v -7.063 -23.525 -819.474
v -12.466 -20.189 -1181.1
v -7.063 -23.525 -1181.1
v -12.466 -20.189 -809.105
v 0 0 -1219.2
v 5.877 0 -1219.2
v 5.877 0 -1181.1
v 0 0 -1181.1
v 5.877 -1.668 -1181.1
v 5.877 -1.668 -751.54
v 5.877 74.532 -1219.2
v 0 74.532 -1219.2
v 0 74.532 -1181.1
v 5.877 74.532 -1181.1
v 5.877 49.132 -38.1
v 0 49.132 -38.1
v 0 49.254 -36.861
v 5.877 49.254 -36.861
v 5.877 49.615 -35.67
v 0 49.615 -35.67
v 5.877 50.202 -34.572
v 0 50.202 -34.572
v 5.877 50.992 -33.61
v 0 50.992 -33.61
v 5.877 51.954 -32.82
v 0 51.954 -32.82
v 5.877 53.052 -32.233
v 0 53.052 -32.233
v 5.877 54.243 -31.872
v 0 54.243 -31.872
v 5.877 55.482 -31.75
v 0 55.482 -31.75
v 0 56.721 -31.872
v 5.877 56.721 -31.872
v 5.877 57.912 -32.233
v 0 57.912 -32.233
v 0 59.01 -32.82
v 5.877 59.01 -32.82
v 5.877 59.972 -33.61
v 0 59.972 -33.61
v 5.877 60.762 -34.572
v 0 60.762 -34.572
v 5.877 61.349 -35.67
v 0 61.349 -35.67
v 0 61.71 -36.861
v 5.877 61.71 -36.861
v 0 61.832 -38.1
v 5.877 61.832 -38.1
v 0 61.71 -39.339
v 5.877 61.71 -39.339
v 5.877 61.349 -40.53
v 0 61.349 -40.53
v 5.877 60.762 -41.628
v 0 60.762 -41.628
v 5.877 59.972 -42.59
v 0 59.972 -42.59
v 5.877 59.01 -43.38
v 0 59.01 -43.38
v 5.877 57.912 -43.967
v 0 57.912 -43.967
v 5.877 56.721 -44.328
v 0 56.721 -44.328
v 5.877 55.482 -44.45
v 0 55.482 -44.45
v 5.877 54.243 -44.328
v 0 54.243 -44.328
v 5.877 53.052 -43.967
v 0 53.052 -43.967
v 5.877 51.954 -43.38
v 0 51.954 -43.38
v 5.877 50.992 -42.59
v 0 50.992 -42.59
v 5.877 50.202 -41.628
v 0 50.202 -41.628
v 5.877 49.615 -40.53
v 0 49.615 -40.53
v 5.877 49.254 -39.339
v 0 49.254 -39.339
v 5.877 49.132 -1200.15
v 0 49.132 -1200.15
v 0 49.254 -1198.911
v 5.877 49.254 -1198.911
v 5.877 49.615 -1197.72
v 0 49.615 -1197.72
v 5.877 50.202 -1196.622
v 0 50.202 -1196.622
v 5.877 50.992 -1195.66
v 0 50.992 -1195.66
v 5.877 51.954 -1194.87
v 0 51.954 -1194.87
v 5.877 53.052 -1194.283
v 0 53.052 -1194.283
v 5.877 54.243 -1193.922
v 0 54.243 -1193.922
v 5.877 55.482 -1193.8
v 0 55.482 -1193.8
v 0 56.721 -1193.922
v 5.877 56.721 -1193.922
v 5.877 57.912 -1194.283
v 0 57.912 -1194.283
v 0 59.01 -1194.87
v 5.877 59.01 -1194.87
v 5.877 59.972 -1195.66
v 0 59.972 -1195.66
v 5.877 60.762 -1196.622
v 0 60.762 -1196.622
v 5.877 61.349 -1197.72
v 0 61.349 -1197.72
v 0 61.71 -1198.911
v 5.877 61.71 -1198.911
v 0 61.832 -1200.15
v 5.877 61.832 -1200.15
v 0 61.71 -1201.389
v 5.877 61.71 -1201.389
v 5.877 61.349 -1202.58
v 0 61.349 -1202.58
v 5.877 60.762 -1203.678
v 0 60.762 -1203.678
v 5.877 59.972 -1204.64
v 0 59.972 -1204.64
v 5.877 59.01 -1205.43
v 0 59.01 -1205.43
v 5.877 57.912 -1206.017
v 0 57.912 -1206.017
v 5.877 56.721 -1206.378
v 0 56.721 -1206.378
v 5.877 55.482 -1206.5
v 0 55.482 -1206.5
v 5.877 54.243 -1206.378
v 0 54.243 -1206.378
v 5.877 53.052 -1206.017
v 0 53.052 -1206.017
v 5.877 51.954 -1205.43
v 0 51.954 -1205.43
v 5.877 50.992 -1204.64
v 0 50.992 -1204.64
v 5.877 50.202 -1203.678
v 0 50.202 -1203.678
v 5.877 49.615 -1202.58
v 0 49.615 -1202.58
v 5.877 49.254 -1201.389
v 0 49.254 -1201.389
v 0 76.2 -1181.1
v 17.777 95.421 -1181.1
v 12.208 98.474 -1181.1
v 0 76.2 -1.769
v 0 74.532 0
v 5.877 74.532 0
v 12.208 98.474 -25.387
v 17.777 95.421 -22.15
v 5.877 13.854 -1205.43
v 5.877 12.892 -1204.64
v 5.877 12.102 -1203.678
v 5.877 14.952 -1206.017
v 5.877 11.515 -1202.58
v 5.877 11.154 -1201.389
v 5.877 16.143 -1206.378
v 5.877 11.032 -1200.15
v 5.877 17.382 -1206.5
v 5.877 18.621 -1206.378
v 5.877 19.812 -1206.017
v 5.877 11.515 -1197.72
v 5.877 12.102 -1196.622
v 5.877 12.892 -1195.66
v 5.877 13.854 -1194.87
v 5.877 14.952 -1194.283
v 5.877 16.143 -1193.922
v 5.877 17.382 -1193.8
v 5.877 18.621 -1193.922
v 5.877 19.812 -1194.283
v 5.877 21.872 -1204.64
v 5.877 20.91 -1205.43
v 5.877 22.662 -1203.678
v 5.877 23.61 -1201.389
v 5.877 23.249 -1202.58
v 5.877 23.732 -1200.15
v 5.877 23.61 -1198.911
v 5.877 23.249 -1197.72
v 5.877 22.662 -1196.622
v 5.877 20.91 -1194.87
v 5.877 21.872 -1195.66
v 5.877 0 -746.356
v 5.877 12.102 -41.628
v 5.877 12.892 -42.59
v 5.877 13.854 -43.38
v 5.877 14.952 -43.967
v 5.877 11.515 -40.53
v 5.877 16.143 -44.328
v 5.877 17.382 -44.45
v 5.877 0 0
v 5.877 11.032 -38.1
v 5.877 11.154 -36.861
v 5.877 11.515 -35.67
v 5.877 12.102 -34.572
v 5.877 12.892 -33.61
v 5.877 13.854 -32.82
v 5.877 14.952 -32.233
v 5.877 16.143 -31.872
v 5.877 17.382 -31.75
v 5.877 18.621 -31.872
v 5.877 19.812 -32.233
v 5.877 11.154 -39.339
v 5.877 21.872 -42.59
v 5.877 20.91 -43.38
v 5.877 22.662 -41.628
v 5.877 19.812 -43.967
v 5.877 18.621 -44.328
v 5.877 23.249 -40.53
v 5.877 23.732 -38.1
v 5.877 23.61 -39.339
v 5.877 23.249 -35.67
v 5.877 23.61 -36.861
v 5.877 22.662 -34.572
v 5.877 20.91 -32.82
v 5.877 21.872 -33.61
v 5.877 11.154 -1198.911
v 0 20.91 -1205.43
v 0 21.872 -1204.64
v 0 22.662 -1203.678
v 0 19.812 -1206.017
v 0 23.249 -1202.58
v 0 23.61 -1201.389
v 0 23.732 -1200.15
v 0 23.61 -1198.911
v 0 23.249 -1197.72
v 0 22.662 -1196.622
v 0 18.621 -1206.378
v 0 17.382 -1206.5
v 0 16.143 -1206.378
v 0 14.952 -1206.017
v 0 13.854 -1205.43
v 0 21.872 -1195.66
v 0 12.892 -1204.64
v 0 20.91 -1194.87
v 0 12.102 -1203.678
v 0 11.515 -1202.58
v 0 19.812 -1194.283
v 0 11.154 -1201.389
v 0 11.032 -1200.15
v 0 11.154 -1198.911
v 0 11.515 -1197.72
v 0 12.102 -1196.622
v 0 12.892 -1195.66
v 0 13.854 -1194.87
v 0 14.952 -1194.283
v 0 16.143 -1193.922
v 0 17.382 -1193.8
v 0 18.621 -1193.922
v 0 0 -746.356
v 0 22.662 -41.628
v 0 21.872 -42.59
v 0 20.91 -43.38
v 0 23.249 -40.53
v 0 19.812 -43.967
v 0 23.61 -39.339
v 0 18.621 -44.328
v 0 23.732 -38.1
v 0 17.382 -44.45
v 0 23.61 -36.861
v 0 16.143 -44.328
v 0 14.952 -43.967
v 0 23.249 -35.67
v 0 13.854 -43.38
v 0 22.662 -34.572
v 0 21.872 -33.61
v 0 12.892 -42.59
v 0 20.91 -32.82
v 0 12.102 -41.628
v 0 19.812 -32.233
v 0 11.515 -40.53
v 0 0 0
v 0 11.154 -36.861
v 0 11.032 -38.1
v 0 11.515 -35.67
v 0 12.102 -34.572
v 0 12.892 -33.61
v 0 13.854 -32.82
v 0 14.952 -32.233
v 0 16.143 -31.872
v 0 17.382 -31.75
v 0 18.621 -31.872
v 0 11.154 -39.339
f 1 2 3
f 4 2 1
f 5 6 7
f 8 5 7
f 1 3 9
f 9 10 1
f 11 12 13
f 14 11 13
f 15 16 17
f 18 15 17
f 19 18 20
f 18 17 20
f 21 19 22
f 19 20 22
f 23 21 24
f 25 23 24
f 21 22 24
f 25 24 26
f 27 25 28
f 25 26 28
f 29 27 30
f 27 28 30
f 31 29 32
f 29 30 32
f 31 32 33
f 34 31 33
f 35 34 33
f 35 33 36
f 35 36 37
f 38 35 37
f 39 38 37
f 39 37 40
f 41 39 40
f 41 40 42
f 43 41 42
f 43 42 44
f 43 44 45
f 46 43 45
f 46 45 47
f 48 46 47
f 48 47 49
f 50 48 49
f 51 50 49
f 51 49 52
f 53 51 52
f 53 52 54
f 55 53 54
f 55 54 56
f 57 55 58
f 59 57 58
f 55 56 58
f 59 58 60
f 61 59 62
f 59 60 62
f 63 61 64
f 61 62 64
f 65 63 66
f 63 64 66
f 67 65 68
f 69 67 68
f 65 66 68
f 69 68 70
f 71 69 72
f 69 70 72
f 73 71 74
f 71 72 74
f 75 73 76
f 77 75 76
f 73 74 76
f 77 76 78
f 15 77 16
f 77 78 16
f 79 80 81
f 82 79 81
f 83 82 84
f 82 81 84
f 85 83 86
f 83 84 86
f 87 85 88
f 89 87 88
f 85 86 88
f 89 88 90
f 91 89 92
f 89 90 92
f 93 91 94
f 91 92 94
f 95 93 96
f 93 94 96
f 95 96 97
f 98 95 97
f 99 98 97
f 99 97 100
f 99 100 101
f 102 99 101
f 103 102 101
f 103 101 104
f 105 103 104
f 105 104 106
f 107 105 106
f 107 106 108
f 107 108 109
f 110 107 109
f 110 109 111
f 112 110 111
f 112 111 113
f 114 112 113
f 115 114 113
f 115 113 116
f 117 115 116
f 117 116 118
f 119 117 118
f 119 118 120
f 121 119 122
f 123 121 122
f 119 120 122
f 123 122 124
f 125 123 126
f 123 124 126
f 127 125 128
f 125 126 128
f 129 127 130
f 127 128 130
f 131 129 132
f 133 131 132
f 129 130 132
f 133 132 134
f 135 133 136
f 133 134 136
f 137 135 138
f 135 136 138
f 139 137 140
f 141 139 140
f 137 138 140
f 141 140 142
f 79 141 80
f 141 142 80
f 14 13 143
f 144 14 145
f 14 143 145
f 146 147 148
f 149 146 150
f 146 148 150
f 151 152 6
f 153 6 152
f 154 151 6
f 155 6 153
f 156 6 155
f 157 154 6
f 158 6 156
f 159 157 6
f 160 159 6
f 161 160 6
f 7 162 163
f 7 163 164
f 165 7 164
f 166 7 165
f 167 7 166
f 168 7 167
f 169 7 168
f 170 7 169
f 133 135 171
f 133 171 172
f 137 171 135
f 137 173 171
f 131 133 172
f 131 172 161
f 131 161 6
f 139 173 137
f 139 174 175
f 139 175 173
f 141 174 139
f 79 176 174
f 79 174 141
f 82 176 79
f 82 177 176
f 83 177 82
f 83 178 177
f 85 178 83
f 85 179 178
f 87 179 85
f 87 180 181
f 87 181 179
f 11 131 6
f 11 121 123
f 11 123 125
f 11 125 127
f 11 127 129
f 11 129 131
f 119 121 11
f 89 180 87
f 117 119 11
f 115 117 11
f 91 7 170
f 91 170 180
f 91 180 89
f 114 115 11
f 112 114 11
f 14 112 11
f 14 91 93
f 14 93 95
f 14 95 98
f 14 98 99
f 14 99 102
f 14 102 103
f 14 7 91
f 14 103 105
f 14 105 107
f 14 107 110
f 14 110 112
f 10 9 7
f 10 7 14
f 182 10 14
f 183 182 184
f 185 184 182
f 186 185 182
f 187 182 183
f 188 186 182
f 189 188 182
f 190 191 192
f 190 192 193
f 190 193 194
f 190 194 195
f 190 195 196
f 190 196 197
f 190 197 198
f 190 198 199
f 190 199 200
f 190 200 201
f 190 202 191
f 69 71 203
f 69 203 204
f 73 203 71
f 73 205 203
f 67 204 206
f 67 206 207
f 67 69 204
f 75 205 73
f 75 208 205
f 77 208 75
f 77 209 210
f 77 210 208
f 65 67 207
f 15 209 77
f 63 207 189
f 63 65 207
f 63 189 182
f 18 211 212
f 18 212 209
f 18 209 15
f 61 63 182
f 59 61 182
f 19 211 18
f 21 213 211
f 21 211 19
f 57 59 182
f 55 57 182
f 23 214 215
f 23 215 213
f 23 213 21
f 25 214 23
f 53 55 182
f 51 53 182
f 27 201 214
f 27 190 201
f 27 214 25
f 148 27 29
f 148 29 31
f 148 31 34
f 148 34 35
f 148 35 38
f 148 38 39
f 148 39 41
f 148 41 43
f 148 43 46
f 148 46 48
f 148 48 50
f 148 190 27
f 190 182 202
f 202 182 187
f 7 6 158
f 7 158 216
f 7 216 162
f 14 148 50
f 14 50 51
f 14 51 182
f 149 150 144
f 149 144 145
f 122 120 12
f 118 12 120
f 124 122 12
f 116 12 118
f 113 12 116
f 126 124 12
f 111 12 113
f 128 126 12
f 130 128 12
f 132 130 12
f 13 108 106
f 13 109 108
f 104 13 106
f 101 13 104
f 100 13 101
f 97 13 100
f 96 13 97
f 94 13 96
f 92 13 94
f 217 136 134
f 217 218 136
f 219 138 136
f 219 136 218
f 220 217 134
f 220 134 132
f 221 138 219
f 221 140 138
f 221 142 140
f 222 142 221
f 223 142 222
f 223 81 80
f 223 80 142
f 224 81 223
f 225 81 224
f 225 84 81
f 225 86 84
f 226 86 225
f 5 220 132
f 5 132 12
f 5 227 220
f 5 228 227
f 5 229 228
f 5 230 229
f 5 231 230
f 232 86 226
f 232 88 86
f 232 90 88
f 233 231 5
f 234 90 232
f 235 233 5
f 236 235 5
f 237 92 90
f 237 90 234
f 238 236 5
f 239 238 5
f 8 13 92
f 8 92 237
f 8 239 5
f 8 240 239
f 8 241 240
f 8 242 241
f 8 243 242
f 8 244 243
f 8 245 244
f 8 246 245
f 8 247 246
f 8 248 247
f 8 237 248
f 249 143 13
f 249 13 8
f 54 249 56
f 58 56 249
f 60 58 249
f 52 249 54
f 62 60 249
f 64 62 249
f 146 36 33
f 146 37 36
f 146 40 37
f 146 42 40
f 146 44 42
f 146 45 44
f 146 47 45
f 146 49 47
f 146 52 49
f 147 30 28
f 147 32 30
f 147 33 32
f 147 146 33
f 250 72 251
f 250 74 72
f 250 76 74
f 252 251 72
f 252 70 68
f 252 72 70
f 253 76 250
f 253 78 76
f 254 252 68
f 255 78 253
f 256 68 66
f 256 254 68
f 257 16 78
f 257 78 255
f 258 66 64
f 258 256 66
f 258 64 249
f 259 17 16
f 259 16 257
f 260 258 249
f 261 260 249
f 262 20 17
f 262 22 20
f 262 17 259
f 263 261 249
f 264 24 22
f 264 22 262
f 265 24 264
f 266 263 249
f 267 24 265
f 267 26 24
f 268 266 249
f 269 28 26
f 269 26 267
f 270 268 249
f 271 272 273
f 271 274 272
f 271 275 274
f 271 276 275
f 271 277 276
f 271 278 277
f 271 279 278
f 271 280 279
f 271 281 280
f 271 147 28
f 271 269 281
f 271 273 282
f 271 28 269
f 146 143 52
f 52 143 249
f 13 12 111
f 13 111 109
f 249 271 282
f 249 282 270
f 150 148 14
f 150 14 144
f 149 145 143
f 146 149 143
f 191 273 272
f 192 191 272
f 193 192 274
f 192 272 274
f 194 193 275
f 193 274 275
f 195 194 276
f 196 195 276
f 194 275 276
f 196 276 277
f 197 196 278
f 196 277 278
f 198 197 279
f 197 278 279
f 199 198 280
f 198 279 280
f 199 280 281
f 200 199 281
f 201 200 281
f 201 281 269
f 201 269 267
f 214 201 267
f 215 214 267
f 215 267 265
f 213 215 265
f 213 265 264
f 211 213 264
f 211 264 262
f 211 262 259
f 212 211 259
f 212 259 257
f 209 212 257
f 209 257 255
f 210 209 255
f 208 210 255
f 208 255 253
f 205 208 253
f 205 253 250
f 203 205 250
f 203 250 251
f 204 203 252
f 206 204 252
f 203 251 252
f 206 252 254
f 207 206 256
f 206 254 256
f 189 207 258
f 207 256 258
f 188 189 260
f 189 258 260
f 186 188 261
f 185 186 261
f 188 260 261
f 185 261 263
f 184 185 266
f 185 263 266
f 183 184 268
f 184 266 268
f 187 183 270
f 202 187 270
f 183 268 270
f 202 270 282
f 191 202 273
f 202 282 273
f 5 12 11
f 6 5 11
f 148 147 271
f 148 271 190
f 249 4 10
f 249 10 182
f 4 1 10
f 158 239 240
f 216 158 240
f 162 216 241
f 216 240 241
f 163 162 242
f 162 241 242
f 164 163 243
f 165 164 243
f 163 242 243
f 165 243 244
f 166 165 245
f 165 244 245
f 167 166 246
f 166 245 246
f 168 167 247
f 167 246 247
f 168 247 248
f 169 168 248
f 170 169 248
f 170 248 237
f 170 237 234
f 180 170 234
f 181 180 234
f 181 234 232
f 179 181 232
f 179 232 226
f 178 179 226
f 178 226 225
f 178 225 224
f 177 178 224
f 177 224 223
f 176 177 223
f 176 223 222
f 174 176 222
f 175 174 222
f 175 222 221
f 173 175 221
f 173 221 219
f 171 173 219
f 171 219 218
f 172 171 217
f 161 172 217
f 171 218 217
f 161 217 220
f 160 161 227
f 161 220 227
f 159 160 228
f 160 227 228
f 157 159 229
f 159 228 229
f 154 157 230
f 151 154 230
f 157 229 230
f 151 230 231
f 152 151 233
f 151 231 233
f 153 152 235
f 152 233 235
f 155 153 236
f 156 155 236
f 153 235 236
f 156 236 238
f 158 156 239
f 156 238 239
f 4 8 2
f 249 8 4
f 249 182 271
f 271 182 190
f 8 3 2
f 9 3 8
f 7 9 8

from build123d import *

# Parameters (mm, degrees)
F1_DEPTH   = 1219.2
F2_W       = 23.9416415725
F2_H       = 38.1
F3_DEPTH   = 17.7778808061
F5_D       = 12.7
F7_D       = 12.7
F8_DEPTH   = 18.3432517809
F1_FACE1_W = 24.0414338853
F1_FACE1_H = 1181.1
F9_DEPTH   = 25.4
F10_W      = 23.5252457925
F10_H      = 38.1
F11_DEPTH  = 25.4
F13_DEPTH  = 25.4


with BuildPart() as f1:
    # F0 (on Top) → F1 (new body)
    with BuildSketch(Plane.XY):
        Polygon((0, 76.2), (0, 0), (-12.4657263412, -20.1891490921), (-7.0626754618, -23.5252457925), (5.8765254397, -1.6680483502), (5.8765254397, 74.5319516498), (17.7768808061, 95.4214725972), (12.2084825006, 98.4735932223), align=None)
    extrude(amount=-F1_DEPTH)

    # F2 (on Right) → F3 (cut, through all)
    with BuildSketch(Plane.YZ):
        with Locations((86.5027724361, -1200.15)):
            Rectangle(F2_W, F2_H)
    extrude(amount=F3_DEPTH, mode=Mode.SUBTRACT)

    # F5 (through all)
    with Locations(Plane.YZ.offset(5.8765254397)):
        with Locations((55.4819516498, -1200.15), (17.3819516498, -1200.15)):
            Hole(F5_D / 2)

    # F7 (through all)
    with Locations(Plane.YZ.offset(5.8765254397)):
        with Locations((55.4819516498, -38.1), (17.3819516498, -38.1)):
            Hole(F7_D / 2)

    # F4 (on face) → F8 (cut, through all)
    with BuildSketch(Plane.YZ.offset(5.8765254397)):
        Polygon((98.4861776233, 0), (74.5319516498, 0), (98.4861776233, -25.4), align=None)
        Polygon((-22.3291479051, 0), (-22.3291479051, -25.4), (-1.6680483502, 0), align=None)
    extrude(amount=-F8_DEPTH, mode=Mode.SUBTRACT)

    # F4 (on face) + F1_face1 (on face) → F9 (cut)
    with BuildSketch(Plane.YZ.offset(5.8765254397)):
        Polygon((98.4861776233, 0), (74.5319516498, 0), (98.4861776233, -25.4), align=None)
        Polygon((-22.3291479051, 0), (-22.3291479051, -25.4), (-1.6680483502, 0), align=None)
    with BuildSketch(Plane(origin=(11.8267031229, 84.9767121235, -590.55), x_dir=(0.4949935775, 0.8688966327, 0), z_dir=(0.8688966327, -0.4949935775, 0))):
        Rectangle(F1_FACE1_W, F1_FACE1_H)
    extrude(amount=F9_DEPTH, dir=(1, 0, 0), mode=Mode.SUBTRACT)

    # F10 (on face) → F11 (cut)
    with BuildSketch(Plane.YZ.offset(5.8765254397)):
        with Locations((-11.7626228962, -1200.15)):
            Rectangle(F10_W, F10_H)
    extrude(amount=-F11_DEPTH, mode=Mode.SUBTRACT)

    # F12 (on face) → F13 (cut)
    with BuildSketch(Plane.YZ.offset(5.8765254397)):
        Polygon((0, -746.356010437), (0, 0), (-23.5252457925, 0), (-23.5252457925, -746.356010437), (-23.5252457925, -819.4740414619), align=None)
    extrude(amount=-F13_DEPTH, mode=Mode.SUBTRACT)


solid = f1.part
